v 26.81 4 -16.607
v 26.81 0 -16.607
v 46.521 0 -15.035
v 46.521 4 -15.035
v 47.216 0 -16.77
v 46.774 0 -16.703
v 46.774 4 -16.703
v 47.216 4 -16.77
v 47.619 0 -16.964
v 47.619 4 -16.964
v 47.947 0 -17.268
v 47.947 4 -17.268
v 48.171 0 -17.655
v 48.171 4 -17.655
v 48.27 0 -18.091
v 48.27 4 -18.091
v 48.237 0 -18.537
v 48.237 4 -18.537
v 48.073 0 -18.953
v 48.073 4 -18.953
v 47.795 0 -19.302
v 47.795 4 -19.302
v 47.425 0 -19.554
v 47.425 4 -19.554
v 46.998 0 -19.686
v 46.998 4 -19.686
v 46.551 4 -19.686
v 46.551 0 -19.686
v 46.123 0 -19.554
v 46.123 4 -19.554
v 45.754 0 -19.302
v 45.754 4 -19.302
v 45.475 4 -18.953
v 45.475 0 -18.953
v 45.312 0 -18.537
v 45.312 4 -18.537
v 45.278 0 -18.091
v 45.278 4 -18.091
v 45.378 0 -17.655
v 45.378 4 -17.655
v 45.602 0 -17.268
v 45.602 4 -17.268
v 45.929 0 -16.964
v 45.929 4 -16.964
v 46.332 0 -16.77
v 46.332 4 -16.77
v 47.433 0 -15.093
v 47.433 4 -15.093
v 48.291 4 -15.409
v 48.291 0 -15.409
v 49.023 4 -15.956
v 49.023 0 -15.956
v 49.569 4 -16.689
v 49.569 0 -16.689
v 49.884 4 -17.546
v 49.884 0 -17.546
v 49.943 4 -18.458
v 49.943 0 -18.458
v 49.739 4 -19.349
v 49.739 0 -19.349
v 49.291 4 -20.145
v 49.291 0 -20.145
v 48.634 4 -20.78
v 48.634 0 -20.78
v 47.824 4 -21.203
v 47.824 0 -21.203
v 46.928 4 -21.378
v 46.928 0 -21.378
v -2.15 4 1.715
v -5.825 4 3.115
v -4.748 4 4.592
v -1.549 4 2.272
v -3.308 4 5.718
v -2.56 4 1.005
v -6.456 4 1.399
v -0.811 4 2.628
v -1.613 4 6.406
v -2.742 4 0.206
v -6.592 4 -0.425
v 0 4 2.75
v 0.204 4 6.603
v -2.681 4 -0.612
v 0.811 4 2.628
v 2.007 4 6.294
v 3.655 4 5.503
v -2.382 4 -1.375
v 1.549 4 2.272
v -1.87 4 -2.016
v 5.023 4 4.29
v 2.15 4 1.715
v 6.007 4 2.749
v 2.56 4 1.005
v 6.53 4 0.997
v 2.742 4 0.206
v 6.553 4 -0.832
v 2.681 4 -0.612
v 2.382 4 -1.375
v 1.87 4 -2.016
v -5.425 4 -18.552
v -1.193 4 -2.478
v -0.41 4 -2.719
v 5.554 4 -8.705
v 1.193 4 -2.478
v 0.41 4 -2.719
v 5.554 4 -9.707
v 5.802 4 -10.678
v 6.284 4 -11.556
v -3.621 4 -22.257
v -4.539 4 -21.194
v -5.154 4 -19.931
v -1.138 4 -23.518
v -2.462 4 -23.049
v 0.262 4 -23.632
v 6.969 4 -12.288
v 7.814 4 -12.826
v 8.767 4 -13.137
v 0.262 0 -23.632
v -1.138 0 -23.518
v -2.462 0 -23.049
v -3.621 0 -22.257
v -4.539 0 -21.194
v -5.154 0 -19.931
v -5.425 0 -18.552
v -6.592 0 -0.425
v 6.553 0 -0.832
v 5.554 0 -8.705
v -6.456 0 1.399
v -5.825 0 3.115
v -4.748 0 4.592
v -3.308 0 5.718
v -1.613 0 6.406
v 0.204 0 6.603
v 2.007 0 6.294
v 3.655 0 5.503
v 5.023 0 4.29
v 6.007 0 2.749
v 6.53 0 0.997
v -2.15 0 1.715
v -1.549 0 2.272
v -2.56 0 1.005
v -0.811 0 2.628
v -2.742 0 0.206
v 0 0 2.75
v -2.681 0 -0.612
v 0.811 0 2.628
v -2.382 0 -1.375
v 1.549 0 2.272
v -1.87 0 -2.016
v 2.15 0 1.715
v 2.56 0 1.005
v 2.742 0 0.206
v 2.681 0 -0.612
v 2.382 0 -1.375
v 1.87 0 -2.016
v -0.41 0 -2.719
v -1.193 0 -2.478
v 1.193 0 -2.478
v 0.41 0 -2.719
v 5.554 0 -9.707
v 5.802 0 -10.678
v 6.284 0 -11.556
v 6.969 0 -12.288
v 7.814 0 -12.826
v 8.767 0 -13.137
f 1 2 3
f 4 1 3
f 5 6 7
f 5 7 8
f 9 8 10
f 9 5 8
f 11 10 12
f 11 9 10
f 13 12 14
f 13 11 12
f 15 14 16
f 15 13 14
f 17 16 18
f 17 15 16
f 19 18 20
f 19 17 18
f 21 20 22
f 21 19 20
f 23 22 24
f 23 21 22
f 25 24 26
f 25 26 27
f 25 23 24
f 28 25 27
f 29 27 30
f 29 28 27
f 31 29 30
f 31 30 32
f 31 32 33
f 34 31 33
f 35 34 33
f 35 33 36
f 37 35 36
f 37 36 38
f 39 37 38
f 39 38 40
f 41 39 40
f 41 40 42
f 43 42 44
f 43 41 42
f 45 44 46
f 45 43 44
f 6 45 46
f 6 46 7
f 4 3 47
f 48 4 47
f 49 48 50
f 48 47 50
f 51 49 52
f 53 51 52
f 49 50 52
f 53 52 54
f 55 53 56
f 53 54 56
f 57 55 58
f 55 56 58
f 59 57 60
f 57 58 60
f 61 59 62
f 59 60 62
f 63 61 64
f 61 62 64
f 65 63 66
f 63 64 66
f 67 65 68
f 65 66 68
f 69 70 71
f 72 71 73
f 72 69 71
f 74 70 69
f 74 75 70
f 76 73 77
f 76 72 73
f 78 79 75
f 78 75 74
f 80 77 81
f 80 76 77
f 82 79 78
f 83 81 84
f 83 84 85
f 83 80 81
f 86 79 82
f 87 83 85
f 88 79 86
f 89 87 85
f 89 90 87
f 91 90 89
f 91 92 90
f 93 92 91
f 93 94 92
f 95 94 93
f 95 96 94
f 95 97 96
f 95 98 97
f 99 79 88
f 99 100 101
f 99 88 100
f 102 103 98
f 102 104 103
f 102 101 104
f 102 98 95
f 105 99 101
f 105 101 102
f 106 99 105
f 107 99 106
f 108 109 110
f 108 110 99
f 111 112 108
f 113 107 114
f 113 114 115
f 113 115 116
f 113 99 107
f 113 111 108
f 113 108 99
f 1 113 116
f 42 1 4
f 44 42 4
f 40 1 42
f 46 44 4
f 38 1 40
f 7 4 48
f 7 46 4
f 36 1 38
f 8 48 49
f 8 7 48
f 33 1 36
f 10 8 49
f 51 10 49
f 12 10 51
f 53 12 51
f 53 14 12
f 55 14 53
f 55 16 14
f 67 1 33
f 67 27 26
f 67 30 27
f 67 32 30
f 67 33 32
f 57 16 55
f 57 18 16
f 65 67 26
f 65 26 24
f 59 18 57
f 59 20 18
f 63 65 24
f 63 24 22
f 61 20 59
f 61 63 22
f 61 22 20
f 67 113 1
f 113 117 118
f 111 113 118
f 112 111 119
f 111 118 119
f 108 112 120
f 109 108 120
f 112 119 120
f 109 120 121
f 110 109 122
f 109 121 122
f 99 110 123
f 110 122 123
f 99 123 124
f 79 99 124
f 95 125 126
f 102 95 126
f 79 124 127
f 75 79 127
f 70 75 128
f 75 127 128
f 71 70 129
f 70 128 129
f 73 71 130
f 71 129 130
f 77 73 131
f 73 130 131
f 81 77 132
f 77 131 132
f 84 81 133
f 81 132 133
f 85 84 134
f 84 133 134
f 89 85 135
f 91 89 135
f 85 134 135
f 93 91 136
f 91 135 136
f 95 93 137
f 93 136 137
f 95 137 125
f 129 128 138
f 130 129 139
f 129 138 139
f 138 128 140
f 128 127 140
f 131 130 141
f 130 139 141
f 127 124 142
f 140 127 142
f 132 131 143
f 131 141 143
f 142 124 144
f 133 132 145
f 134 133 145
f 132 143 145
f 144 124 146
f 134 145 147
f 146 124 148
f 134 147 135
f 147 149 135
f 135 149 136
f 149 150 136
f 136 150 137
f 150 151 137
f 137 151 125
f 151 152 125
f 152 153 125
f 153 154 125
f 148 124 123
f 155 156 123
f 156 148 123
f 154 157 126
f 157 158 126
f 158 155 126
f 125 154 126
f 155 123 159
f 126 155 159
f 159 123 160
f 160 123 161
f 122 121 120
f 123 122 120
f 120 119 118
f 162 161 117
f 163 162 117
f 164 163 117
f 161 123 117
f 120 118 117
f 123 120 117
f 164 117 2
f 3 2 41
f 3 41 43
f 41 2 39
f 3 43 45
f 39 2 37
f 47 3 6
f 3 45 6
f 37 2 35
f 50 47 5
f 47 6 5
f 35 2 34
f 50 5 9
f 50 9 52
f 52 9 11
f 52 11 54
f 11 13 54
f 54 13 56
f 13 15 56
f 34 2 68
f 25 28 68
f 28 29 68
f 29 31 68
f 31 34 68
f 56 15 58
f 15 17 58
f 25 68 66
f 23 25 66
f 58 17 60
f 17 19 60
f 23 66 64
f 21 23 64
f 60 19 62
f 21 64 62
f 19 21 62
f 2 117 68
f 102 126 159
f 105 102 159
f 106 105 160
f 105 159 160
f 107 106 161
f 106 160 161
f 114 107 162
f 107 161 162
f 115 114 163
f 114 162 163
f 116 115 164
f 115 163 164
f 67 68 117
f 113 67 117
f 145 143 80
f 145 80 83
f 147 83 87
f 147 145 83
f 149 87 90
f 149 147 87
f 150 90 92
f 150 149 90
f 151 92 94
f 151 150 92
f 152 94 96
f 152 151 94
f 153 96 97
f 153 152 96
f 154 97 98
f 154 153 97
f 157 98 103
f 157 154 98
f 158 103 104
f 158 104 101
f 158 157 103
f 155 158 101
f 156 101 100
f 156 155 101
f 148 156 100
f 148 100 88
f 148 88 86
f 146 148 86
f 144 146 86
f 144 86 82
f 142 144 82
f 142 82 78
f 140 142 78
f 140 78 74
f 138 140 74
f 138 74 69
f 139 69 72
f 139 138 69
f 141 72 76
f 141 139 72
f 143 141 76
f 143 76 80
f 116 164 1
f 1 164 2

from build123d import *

# Parameters (mm, degrees)
SKETCH1_R           = 2.75
SKETCH1_R_2         = 1.5
BOSS_EXTRUDE1_DEPTH = 4


with BuildPart() as part:
    # Sketch1 → Boss-Extrude1 (new body)
    with BuildSketch(Plane(origin=(0, 0, 0), x_dir=(1, 0, 0), z_dir=(0, 1, 0))):
        with BuildLine():
            Line((-5.42452127, 18.55232243), (-6.592163913, 0.424614729))
            ThreePointArc((-6.592163913, 0.424614729), (0.204408635, -6.602661572), (6.553274043, 0.831578043))
            Line((6.553274043, 0.831578043), (5.554165127, 8.705083814))
            ThreePointArc((5.554165127, 8.705083814), (6.283820074, 11.556382789), (8.766792184, 13.136620645))
            Line((8.766792184, 13.136620645), (26.80965439, 16.607175604))
            Line((26.80965439, 16.607175604), (46.521475319, 15.034505243))
            ThreePointArc((46.521475319, 15.034505243), (49.9462455, 17.999804862), (46.927651625, 21.377695275))
            Line((46.927651625, 21.377695275), (0.262324785, 23.632347033))
            ThreePointArc((0.262324785, 23.632347033), (-3.621288531, 22.256778313), (-5.42452127, 18.55232243))
        make_face()
        with Locations(Location((0, 0, 0), (0, 0, 270))):
            Circle(SKETCH1_R, mode=Mode.SUBTRACT)
        with Locations(Location((46.774261136, 18.202917946, 0), (0, 0, 270))):
            Circle(SKETCH1_R_2, mode=Mode.SUBTRACT)
    extrude(amount=BOSS_EXTRUDE1_DEPTH)


solid = part.part
